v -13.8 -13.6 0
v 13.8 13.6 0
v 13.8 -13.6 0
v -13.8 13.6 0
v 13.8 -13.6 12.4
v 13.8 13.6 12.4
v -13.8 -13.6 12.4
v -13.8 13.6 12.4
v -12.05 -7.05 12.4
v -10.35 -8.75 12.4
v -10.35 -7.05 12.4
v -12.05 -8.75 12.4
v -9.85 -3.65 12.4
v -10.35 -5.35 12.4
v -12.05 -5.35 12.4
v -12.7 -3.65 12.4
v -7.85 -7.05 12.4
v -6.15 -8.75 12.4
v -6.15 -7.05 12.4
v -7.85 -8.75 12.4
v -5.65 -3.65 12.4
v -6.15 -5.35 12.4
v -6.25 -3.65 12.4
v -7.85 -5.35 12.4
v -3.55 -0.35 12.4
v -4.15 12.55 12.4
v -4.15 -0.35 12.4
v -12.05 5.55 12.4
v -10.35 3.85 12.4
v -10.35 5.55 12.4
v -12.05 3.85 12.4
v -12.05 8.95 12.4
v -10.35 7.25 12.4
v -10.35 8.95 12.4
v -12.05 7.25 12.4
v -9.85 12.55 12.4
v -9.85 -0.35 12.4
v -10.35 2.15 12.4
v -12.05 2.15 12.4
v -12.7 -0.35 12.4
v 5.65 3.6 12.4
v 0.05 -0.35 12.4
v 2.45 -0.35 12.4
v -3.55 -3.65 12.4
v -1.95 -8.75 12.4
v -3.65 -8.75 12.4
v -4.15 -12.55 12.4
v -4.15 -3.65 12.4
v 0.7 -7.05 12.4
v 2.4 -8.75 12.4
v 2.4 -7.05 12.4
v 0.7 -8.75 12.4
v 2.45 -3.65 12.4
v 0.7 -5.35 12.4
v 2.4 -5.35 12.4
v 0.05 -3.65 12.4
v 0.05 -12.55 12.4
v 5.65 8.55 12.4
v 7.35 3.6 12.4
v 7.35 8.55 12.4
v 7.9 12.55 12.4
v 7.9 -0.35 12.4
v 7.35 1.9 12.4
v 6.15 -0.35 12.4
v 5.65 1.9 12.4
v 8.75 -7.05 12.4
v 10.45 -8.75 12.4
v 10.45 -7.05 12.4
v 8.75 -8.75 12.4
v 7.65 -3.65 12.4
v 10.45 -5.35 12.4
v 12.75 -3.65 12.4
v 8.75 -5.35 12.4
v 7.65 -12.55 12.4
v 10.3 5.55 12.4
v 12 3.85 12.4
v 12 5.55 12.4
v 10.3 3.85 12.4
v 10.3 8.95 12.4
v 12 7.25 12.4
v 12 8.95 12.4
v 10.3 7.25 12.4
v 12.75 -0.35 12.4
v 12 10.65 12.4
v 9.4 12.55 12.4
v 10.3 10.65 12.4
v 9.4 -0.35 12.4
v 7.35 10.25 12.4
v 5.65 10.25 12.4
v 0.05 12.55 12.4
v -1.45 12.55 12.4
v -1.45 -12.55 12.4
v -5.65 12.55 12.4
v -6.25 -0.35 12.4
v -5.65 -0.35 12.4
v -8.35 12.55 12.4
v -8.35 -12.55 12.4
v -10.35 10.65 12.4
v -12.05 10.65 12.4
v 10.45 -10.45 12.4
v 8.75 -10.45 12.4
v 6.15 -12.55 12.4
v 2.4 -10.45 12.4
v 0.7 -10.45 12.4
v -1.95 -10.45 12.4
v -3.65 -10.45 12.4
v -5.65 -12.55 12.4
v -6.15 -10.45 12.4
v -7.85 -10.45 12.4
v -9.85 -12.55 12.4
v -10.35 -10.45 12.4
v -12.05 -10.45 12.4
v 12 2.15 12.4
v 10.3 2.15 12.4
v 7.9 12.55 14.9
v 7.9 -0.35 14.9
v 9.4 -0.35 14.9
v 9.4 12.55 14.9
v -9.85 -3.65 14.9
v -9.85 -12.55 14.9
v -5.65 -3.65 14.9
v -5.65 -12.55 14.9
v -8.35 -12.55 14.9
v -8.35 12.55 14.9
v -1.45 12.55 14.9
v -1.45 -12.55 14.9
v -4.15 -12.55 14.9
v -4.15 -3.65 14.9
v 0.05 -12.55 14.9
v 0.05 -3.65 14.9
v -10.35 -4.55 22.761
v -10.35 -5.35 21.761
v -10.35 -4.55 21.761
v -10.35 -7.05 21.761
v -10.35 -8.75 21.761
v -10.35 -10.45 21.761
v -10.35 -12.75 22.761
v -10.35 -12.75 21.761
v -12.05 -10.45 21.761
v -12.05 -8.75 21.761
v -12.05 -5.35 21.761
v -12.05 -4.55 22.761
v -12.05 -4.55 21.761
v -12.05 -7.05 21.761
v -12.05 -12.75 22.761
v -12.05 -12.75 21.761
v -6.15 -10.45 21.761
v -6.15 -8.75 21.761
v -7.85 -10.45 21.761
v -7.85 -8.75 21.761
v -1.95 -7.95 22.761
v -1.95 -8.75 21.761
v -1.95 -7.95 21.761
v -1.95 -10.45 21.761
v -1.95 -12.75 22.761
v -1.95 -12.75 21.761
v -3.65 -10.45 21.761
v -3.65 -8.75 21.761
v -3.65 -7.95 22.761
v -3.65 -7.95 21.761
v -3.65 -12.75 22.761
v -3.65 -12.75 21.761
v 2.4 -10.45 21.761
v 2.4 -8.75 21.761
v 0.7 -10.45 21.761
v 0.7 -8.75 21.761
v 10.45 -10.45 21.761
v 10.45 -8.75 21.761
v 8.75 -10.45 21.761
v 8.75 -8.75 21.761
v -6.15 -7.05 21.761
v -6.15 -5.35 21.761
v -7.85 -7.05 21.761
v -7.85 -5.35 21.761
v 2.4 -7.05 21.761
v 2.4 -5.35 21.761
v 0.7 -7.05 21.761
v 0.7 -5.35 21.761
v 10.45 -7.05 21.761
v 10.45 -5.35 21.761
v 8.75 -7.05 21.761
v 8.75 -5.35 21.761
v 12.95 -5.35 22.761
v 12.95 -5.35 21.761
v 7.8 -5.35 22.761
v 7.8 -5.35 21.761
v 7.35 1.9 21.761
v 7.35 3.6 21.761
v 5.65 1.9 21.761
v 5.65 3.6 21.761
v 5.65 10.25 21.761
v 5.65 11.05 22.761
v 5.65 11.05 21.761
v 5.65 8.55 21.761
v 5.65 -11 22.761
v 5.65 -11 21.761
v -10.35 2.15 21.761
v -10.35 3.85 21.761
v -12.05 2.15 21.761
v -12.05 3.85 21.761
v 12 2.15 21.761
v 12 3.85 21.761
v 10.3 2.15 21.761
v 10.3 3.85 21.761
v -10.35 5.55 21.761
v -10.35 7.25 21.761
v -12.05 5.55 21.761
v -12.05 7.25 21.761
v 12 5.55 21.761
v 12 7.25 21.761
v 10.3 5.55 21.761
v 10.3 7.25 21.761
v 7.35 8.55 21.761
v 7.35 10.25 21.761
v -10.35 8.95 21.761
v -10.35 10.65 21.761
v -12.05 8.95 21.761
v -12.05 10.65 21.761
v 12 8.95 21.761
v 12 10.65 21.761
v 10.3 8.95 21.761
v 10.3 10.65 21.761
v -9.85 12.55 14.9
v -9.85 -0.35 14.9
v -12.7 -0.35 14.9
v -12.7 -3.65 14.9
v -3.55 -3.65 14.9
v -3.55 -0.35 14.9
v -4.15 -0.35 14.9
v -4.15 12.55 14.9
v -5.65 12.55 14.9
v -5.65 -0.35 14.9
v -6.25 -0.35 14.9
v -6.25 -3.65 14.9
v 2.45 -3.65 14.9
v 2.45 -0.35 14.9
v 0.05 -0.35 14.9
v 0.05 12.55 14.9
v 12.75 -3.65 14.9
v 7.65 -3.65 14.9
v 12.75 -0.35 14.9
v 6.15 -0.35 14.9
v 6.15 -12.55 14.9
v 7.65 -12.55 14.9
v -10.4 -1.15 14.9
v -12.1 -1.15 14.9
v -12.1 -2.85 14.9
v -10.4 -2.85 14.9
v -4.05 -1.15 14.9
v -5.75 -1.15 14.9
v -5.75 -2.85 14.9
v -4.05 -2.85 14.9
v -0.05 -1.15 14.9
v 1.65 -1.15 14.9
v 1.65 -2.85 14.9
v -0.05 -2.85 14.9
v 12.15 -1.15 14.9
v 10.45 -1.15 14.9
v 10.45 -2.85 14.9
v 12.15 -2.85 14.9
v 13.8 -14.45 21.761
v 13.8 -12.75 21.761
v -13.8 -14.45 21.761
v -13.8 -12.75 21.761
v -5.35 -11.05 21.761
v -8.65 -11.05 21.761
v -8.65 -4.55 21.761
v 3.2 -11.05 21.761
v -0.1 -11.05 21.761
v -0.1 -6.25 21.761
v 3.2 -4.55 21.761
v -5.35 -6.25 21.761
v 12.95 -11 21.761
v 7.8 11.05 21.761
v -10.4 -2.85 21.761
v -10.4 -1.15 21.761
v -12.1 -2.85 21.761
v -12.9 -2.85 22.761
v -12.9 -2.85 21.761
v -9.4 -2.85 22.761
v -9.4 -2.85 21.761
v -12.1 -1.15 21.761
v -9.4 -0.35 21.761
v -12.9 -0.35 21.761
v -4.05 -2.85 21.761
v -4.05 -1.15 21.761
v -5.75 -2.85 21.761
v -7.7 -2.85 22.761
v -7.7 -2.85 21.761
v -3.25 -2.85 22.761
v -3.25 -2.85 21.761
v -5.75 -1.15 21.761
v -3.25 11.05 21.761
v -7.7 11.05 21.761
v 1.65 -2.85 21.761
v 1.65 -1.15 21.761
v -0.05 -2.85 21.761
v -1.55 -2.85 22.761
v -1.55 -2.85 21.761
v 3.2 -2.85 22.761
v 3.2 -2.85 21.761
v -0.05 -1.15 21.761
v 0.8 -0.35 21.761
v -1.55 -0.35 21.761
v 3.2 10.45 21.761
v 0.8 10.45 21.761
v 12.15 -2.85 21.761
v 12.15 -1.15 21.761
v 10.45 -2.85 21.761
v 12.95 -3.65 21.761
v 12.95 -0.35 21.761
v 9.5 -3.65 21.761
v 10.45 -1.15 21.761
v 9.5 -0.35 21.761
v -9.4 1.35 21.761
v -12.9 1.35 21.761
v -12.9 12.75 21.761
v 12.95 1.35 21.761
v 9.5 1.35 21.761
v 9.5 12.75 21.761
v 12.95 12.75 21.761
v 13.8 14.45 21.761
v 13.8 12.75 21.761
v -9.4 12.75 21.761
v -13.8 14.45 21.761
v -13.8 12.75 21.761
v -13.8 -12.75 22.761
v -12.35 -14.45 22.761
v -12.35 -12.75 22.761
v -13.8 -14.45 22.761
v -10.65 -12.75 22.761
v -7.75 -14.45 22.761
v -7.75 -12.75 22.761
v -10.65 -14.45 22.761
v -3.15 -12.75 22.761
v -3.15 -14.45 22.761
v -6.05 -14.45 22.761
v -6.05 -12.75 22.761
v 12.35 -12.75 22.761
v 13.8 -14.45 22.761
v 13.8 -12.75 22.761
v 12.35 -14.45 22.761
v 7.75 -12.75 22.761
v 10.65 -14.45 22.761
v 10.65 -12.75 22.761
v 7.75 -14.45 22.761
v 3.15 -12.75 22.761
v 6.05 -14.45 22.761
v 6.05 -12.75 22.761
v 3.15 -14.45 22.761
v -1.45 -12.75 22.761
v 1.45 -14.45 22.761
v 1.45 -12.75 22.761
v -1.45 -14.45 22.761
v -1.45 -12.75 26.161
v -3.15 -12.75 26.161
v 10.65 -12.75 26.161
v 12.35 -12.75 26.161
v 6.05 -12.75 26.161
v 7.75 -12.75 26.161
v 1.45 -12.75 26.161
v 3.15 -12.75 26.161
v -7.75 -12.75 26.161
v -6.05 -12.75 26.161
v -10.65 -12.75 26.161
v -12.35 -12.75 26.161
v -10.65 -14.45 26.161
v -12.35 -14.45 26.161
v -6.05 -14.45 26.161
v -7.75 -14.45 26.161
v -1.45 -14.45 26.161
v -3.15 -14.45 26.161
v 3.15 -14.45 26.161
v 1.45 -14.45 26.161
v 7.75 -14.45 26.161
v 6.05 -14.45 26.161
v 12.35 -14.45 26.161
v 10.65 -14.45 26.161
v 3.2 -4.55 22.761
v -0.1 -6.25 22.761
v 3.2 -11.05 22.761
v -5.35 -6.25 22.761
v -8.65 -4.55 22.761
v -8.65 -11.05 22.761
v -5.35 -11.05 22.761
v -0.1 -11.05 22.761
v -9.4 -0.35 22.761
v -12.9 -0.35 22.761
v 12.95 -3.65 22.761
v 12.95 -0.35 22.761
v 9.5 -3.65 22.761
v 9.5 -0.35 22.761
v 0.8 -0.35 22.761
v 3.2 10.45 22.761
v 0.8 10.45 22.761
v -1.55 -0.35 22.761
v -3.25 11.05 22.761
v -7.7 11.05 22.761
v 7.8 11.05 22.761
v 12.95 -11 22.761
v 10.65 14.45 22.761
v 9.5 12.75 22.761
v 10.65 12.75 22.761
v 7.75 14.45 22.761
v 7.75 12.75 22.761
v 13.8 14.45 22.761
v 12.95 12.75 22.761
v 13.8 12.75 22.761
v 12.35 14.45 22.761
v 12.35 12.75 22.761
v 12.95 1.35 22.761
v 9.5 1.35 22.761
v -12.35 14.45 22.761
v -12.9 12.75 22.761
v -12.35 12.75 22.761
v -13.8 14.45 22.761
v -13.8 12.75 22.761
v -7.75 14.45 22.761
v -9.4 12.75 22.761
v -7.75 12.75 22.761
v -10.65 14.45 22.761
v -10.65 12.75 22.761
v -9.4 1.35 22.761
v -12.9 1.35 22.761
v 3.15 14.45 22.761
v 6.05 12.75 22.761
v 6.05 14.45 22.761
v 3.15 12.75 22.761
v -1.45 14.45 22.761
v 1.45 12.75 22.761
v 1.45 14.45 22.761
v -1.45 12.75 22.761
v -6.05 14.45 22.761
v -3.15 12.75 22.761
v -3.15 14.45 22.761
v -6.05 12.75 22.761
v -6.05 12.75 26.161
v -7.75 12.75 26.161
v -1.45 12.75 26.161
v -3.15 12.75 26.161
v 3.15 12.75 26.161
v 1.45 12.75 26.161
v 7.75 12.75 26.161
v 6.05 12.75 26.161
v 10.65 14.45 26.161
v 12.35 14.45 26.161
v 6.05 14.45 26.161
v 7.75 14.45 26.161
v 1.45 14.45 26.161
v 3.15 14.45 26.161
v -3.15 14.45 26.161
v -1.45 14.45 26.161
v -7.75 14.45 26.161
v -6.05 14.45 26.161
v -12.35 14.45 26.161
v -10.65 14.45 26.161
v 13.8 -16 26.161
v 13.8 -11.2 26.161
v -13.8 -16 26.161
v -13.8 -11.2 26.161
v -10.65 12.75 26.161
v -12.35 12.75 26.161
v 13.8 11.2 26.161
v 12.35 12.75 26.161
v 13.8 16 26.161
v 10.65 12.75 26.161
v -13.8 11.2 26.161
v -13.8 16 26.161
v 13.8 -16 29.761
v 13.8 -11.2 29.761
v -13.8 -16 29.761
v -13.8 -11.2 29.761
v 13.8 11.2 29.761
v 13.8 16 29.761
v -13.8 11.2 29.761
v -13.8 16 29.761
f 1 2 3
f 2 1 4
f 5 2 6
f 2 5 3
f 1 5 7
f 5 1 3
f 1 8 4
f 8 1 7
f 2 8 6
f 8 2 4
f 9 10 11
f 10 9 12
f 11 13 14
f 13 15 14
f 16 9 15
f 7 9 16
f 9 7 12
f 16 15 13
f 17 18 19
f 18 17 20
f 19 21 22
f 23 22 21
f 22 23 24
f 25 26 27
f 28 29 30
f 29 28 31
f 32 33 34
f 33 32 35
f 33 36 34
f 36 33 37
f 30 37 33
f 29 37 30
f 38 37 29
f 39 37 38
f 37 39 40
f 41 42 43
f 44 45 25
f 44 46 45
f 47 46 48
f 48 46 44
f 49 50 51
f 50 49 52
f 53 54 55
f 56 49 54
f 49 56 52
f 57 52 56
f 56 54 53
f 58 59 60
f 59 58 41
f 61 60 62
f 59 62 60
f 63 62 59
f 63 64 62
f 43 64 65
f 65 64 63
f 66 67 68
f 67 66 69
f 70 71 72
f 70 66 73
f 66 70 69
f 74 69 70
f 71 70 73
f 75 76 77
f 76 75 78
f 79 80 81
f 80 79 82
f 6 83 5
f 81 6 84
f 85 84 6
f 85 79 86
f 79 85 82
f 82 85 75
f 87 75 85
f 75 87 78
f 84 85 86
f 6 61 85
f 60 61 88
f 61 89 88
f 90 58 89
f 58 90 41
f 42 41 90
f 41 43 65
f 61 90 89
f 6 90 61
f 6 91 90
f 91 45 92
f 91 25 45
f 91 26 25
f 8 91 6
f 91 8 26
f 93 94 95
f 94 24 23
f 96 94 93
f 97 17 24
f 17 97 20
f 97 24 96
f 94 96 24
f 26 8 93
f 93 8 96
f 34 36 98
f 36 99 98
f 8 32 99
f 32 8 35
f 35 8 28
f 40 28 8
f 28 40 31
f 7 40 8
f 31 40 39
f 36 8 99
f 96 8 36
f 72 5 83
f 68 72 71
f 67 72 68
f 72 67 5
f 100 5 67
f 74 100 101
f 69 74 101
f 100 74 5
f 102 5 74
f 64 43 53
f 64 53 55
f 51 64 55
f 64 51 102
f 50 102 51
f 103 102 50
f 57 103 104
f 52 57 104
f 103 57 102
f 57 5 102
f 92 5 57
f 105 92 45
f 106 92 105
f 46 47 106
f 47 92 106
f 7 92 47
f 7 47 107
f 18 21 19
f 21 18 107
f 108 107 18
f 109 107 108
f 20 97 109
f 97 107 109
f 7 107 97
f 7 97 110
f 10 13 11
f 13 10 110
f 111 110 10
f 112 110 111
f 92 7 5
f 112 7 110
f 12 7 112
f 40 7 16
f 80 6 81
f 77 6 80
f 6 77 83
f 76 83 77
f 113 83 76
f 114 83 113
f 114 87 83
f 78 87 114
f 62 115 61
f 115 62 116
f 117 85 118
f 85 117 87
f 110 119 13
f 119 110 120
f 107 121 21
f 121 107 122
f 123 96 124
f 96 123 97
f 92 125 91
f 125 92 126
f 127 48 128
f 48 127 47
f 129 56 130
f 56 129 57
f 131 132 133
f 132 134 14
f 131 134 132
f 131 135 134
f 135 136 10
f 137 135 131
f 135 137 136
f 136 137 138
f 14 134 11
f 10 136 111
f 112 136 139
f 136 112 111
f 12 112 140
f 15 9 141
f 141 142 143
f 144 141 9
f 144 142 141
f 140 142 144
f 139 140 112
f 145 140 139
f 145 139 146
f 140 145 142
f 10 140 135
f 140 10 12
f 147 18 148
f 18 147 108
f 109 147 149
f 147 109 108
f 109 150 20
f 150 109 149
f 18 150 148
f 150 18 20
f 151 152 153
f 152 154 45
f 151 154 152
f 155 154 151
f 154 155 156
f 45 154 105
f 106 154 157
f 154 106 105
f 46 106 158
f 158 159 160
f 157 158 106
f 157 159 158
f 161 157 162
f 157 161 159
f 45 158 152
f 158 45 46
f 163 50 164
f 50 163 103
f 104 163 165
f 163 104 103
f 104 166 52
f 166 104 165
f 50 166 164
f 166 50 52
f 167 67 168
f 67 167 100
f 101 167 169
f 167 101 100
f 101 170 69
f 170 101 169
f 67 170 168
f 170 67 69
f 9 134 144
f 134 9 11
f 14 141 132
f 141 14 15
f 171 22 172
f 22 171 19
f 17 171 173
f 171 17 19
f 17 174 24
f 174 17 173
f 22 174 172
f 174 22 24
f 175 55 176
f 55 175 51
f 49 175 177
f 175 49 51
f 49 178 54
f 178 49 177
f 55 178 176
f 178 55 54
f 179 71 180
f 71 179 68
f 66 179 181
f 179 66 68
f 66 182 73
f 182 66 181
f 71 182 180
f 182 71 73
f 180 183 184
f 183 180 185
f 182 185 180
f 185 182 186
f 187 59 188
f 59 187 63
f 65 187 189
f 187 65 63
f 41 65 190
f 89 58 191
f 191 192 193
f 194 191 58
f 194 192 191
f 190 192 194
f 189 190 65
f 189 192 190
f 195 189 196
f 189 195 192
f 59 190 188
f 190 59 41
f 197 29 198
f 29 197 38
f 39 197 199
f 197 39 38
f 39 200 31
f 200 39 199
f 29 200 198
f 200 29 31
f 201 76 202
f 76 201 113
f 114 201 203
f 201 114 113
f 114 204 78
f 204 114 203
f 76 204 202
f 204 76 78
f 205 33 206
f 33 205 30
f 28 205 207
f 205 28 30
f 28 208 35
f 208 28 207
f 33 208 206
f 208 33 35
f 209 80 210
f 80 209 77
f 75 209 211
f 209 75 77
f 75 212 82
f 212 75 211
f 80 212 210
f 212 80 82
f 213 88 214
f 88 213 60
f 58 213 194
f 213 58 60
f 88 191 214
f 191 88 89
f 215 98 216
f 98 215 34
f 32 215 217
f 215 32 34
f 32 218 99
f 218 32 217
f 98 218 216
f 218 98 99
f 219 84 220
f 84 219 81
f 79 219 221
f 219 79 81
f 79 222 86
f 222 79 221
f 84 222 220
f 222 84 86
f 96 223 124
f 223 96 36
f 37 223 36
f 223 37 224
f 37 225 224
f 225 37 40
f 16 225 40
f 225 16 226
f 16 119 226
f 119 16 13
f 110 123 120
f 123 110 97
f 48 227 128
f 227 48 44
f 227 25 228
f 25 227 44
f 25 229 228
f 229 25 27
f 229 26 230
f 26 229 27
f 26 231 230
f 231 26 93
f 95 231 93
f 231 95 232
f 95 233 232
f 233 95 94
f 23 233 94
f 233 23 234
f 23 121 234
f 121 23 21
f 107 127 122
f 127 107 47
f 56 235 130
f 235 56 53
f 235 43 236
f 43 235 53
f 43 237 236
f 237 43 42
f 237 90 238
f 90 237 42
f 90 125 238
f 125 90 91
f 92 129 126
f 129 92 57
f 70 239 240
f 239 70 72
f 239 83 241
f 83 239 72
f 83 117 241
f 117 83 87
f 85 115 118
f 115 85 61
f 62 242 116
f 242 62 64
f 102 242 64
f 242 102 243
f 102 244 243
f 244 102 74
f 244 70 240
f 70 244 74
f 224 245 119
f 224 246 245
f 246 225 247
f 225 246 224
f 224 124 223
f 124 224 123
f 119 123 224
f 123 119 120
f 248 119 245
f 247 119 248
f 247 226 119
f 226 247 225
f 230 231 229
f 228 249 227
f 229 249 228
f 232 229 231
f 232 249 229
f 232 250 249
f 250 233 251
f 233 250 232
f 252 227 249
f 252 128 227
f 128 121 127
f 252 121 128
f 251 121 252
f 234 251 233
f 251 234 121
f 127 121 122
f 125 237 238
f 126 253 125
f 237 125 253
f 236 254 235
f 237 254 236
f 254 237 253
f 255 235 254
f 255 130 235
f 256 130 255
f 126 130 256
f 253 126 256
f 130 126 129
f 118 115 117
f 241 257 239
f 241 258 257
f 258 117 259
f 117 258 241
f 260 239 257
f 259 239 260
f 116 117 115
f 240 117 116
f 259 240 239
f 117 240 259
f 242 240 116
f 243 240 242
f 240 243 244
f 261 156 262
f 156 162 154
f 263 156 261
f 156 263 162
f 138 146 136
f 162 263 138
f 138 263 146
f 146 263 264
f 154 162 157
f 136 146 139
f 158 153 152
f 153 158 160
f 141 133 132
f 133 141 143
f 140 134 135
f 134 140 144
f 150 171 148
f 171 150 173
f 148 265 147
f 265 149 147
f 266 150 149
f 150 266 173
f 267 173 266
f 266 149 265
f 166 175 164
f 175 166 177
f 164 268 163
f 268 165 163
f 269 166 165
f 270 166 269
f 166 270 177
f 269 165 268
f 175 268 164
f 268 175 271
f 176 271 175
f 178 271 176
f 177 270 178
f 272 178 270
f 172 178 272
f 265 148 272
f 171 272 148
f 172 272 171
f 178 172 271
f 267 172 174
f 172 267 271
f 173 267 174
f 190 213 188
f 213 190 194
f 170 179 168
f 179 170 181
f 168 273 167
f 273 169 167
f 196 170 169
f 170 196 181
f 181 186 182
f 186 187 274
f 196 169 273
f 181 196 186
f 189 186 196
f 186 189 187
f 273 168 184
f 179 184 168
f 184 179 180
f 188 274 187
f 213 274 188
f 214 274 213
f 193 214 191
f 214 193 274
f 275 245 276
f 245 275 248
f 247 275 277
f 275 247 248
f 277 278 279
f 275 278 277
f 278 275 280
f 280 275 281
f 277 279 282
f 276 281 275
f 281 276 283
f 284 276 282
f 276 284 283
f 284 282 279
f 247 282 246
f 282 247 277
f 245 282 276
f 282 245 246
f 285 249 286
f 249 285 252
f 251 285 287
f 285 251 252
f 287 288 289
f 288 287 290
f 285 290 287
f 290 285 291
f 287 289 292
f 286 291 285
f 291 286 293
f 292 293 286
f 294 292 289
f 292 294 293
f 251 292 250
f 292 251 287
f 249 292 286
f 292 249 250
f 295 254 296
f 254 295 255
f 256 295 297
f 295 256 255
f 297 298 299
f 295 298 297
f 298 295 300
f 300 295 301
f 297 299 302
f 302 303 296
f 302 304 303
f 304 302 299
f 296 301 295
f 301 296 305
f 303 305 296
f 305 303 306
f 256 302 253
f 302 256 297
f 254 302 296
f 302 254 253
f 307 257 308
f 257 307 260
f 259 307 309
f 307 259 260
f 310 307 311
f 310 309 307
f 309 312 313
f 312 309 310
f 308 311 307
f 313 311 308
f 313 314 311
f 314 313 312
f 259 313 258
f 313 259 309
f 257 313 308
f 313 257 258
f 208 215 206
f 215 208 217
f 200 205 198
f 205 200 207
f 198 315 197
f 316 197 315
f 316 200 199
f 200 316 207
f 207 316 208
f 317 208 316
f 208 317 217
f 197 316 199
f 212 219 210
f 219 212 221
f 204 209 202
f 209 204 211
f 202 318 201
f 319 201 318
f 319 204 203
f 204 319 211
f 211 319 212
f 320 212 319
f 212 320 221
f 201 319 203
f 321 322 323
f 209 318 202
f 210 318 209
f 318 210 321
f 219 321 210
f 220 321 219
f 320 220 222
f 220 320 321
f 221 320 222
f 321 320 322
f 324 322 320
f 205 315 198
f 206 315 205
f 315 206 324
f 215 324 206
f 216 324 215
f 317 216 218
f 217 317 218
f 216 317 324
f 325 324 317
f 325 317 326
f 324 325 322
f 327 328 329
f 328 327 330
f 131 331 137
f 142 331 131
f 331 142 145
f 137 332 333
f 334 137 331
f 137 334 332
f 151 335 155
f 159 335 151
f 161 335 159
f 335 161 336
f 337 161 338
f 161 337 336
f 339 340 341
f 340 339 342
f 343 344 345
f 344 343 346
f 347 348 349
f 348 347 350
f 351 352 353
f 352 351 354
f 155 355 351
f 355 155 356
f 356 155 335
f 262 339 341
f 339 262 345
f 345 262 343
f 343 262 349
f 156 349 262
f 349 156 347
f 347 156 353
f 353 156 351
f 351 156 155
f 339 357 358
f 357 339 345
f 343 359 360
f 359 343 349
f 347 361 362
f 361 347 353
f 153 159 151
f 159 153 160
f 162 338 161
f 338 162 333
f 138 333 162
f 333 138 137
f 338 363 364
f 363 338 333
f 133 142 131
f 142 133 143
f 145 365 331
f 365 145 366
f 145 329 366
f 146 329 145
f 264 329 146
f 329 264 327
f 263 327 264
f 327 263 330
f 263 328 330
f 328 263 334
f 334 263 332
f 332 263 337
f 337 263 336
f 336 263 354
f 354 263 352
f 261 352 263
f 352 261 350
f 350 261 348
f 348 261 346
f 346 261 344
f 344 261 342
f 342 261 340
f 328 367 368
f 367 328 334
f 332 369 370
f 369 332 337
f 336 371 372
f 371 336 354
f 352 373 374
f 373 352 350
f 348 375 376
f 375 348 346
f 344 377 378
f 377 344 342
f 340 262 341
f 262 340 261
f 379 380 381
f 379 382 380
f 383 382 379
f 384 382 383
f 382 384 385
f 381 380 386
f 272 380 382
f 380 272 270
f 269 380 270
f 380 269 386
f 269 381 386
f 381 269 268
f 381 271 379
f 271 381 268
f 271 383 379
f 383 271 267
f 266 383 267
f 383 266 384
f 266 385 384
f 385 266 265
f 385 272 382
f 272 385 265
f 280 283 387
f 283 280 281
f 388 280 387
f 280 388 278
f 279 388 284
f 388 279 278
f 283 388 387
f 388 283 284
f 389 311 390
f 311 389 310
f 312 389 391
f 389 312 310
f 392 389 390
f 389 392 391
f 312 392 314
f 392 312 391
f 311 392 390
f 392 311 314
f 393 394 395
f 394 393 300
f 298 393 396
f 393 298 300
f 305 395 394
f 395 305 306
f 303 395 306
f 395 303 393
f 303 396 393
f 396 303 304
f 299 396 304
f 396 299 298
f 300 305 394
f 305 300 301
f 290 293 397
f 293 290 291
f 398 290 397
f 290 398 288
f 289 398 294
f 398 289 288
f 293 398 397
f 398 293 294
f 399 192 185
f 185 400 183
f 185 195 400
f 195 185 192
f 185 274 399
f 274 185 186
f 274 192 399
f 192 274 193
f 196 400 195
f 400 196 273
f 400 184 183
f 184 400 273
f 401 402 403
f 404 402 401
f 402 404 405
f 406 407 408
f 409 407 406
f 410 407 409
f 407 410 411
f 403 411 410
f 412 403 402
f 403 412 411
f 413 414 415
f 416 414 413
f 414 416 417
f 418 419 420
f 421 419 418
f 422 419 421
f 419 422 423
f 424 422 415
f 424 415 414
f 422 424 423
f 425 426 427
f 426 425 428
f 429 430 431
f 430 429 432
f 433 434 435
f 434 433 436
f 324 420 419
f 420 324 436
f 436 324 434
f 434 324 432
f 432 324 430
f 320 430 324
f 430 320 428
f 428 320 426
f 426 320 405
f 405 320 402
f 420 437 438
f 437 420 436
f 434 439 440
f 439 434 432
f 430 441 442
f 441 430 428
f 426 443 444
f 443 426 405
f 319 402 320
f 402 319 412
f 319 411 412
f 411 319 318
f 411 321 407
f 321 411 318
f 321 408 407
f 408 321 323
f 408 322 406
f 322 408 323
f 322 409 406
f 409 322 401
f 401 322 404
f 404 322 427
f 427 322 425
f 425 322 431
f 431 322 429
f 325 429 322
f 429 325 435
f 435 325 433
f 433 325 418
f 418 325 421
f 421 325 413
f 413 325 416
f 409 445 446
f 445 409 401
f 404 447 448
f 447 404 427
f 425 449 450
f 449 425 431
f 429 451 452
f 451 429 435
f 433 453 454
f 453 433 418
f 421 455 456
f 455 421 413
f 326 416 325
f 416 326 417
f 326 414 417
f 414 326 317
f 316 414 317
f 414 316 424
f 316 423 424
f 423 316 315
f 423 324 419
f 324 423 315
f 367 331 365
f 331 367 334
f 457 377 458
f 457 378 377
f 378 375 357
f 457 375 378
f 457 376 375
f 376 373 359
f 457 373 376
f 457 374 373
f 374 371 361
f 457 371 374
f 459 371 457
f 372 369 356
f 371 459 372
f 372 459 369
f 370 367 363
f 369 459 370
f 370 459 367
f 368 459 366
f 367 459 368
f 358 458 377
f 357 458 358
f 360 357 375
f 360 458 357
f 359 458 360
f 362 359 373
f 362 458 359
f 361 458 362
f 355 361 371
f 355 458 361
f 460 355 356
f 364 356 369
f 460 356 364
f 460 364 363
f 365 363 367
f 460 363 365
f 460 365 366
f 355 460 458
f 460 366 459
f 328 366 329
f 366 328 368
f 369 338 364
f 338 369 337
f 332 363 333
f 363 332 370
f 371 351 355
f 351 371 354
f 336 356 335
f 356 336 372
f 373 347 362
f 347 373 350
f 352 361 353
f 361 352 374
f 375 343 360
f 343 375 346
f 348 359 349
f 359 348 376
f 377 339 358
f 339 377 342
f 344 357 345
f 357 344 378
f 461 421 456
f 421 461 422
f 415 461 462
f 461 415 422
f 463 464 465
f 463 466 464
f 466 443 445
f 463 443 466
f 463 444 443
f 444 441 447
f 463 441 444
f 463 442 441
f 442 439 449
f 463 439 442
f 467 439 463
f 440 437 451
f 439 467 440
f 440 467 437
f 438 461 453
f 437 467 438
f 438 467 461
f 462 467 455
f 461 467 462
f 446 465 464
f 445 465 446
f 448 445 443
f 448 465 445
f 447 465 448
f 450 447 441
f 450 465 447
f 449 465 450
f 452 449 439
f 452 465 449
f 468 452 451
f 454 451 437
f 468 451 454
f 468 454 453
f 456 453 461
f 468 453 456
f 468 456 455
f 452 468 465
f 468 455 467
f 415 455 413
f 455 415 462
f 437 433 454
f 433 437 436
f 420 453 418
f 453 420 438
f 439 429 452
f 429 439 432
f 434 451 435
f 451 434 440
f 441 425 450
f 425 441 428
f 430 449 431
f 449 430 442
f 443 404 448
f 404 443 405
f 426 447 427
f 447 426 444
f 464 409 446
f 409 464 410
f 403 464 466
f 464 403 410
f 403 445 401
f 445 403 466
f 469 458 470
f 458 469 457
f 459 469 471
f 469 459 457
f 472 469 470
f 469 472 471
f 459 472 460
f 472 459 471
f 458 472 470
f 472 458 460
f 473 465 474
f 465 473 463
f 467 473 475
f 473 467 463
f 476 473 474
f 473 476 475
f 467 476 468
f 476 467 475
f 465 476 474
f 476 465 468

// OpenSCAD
// Generated by SolidPython 0.4.2 on 2020-09-29 23:22:00
//!OpenSCAD

scale(v = 0.0100000000) {
	translate(v = [-1380, -1360, 0]) {
		union() {
			color(c = [0.4000000000, 0.4000000000, 0.4000000000]) {
				translate(v = [0, 0, 0]) {
					linear_extrude(height = 1000.0000000000) {
						polygon(paths = [[0, 1, 2, 3]], points = [[0, 0], [0, 2720], [2760, 2720], [2760, 0]]);
					}
				}
			}
			color(c = [0.2000000000, 0.6000000000, 0.2000000000]) {
				translate(v = [0, 0, 1000.0000000000]) {
					linear_extrude(height = 120.0000000000) {
						polygon(paths = [[0, 1, 2, 3]], points = [[0, 1305], [0, 2720], [2760, 2720], [2760, 1305]]);
					}
				}
			}
			color(c = [0.4000000000, 0.4000000000, 0.4000000000]) {
				translate(v = [0, 0, 1000.0000000000]) {
					linear_extrude(height = 120.0000000000) {
						polygon(paths = [[0, 1, 2, 3]], points = [[0, 0], [0, 1305], [2760, 1305], [2760, 0]]);
					}
				}
			}
			color(c = [0.9000000000, 0.6000000000, 0.6000000000]) {
				translate(v = [0, 0, 1120.0000000000]) {
					linear_extrude(height = 120.0000000000) {
						polygon(paths = [[0, 1, 2, 3]], points = [[135, 1485], [135, 2485], [395, 2485], [395, 1485]]);
					}
				}
			}
			color(c = [0.9000000000, 0.6000000000, 0.6000000000]) {
				translate(v = [0, 0, 1120.0000000000]) {
					linear_extrude(height = 120.0000000000) {
						polygon(paths = [[0, 1, 2, 3]], points = [[545, 1485], [545, 2485], [815, 2485], [815, 1485]]);
					}
				}
			}
			color(c = [0.9000000000, 0.6000000000, 0.6000000000]) {
				translate(v = [0, 0, 1120.0000000000]) {
					linear_extrude(height = 120.0000000000) {
						polygon(paths = [[0, 1, 2, 3]], points = [[965, 1485], [965, 2485], [1235, 2485], [1235, 1485]]);
					}
				}
			}
			color(c = [0.9000000000, 0.6000000000, 0.6000000000]) {
				translate(v = [0, 0, 1120.0000000000]) {
					linear_extrude(height = 120.0000000000) {
						polygon(paths = [[0, 1, 2, 3]], points = [[1385, 1485], [1385, 2485], [2170, 2485], [2170, 1485]]);
					}
				}
			}
			color(c = [0.9000000000, 0.6000000000, 0.6000000000]) {
				translate(v = [0, 0, 1120.0000000000]) {
					linear_extrude(height = 120.0000000000) {
						polygon(paths = [[0, 1, 2, 3]], points = [[2320, 1485], [2320, 2485], [2620, 2485], [2620, 1485]]);
					}
				}
			}
			color(c = [0.9000000000, 0.6000000000, 0.9000000000]) {
				translate(v = [0, 0, 1120.0000000000]) {
					linear_extrude(height = 120.0000000000) {
						polygon(paths = [[0, 1, 2, 3]], points = [[135, 235], [135, 885], [395, 885], [395, 235]]);
					}
				}
			}
			color(c = [0.9000000000, 0.6000000000, 0.9000000000]) {
				translate(v = [0, 0, 1120.0000000000]) {
					linear_extrude(height = 120.0000000000) {
						polygon(paths = [[0, 1, 2, 3]], points = [[545, 235], [545, 885], [815, 885], [815, 235]]);
					}
				}
			}
			color(c = [0.9000000000, 0.6000000000, 0.9000000000]) {
				translate(v = [0, 0, 1120.0000000000]) {
					linear_extrude(height = 120.0000000000) {
						polygon(paths = [[0, 1, 2, 3]], points = [[965, 235], [965, 885], [1235, 885], [1235, 235]]);
					}
				}
			}
			color(c = [0.9000000000, 0.6000000000, 0.9000000000]) {
				translate(v = [0, 0, 1120.0000000000]) {
					linear_extrude(height = 120.0000000000) {
						polygon(paths = [[0, 1, 2, 3]], points = [[1385, 235], [1385, 885], [1995, 885], [1995, 235]]);
					}
				}
			}
			color(c = [0.9000000000, 0.6000000000, 0.9000000000]) {
				translate(v = [0, 0, 1120.0000000000]) {
					linear_extrude(height = 120.0000000000) {
						polygon(paths = [[0, 1, 2, 3]], points = [[2145, 235], [2145, 885], [2485, 885], [2485, 235]]);
					}
				}
			}
			color(c = [0.2000000000, 0.6000000000, 0.2000000000]) {
				translate(v = [0, 0, 1120.0000000000]) {
					linear_extrude(height = 120.0000000000) {
						difference() {
							polygon(paths = [[0, 1, 2, 3]], points = [[0, 1305], [0, 2720], [2760, 2720], [2760, 1305]]);
							polygon(paths = [[0, 1, 2, 3]], points = [[135, 1485], [395, 1485], [395, 2485], [135, 2485]]);
							polygon(paths = [[0, 1, 2, 3]], points = [[545, 1485], [815, 1485], [815, 2485], [545, 2485]]);
							polygon(paths = [[0, 1, 2, 3]], points = [[965, 1485], [1235, 1485], [1235, 2485], [965, 2485]]);
							polygon(paths = [[0, 1, 2, 3]], points = [[1385, 1485], [2170, 1485], [2170, 2485], [1385, 2485]]);
							polygon(paths = [[0, 1, 2, 3]], points = [[2320, 1485], [2620, 1485], [2620, 2485], [2320, 2485]]);
						}
					}
				}
			}
			color(c = [0.4000000000, 0.4000000000, 0.4000000000]) {
				translate(v = [0, 0, 1120.0000000000]) {
					linear_extrude(height = 120.0000000000) {
						difference() {
							polygon(paths = [[0, 1, 2, 3]], points = [[0, 0], [0, 1305], [2760, 1305], [2760, 0]]);
							polygon(paths = [[0, 1, 2, 3]], points = [[135, 235], [395, 235], [395, 885], [135, 885]]);
							polygon(paths = [[0, 1, 2, 3]], points = [[545, 235], [815, 235], [815, 885], [545, 885]]);
							polygon(paths = [[0, 1, 2, 3]], points = [[965, 235], [1235, 235], [1235, 885], [965, 885]]);
							polygon(paths = [[0, 1, 2, 3]], points = [[1385, 235], [1995, 235], [1995, 885], [1385, 885]]);
							polygon(paths = [[0, 1, 2, 3]], points = [[2145, 235], [2485, 235], [2485, 885], [2145, 885]]);
						}
					}
				}
			}
			color(c = [0.1000000000, 0.1000000000, 0.1000000000]) {
				translate(v = [0, 0, 1240.0000000000]) {
					linear_extrude(height = 70.0000000000) {
						polygon(paths = [[0, 1, 2, 3]], points = [[175, 315], [175, 485], [345, 485], [345, 315]]);
					}
				}
			}
			color(c = [0.1000000000, 0.1000000000, 0.1000000000]) {
				translate(v = [0, 0, 1240.0000000000]) {
					linear_extrude(height = 70.0000000000) {
						polygon(paths = [[0, 1, 2, 3]], points = [[595, 315], [595, 485], [765, 485], [765, 315]]);
					}
				}
			}
			color(c = [0.1000000000, 0.1000000000, 0.1000000000]) {
				translate(v = [0, 0, 1240.0000000000]) {
					linear_extrude(height = 70.0000000000) {
						polygon(paths = [[0, 1, 2, 3]], points = [[1015, 315], [1015, 485], [1185, 485], [1185, 315]]);
					}
				}
			}
			color(c = [0.1000000000, 0.1000000000, 0.1000000000]) {
				translate(v = [0, 0, 1240.0000000000]) {
					linear_extrude(height = 70.0000000000) {
						polygon(paths = [[0, 1, 2, 3]], points = [[1450, 315], [1450, 485], [1620, 485], [1620, 315]]);
					}
				}
			}
			color(c = [0.1000000000, 0.1000000000, 0.1000000000]) {
				translate(v = [0, 0, 1240.0000000000]) {
					linear_extrude(height = 70.0000000000) {
						polygon(paths = [[0, 1, 2, 3]], points = [[2255, 315], [2255, 485], [2425, 485], [2425, 315]]);
					}
				}
			}
			color(c = [0.1000000000, 0.1000000000, 0.1000000000]) {
				translate(v = [0, 0, 1240.0000000000]) {
					linear_extrude(height = 70.0000000000) {
						polygon(paths = [[0, 1, 2, 3]], points = [[175, 655], [175, 825], [345, 825], [345, 655]]);
					}
				}
			}
			color(c = [0.1000000000, 0.1000000000, 0.1000000000]) {
				translate(v = [0, 0, 1240.0000000000]) {
					linear_extrude(height = 70.0000000000) {
						polygon(paths = [[0, 1, 2, 3]], points = [[595, 655], [595, 825], [765, 825], [765, 655]]);
					}
				}
			}
			color(c = [0.1000000000, 0.1000000000, 0.1000000000]) {
				translate(v = [0, 0, 1240.0000000000]) {
					linear_extrude(height = 70.0000000000) {
						polygon(paths = [[0, 1, 2, 3]], points = [[1450, 655], [1450, 825], [1620, 825], [1620, 655]]);
					}
				}
			}
			color(c = [0.1000000000, 0.1000000000, 0.1000000000]) {
				translate(v = [0, 0, 1240.0000000000]) {
					linear_extrude(height = 70.0000000000) {
						polygon(paths = [[0, 1, 2, 3]], points = [[2255, 655], [2255, 825], [2425, 825], [2425, 655]]);
					}
				}
			}
			color(c = [0.1000000000, 0.1000000000, 0.1000000000]) {
				translate(v = [0, 0, 1240.0000000000]) {
					linear_extrude(height = 70.0000000000) {
						polygon(paths = [[0, 1, 2, 3]], points = [[1945, 1550], [1945, 1720], [2115, 1720], [2115, 1550]]);
					}
				}
			}
			color(c = [0.1000000000, 0.1000000000, 0.1000000000]) {
				translate(v = [0, 0, 1240.0000000000]) {
					linear_extrude(height = 70.0000000000) {
						polygon(paths = [[0, 1, 2, 3]], points = [[175, 1575], [175, 1745], [345, 1745], [345, 1575]]);
					}
				}
			}
			color(c = [0.1000000000, 0.1000000000, 0.1000000000]) {
				translate(v = [0, 0, 1240.0000000000]) {
					linear_extrude(height = 70.0000000000) {
						polygon(paths = [[0, 1, 2, 3]], points = [[2410, 1575], [2410, 1745], [2580, 1745], [2580, 1575]]);
					}
				}
			}
			color(c = [0.1000000000, 0.1000000000, 0.1000000000]) {
				translate(v = [0, 0, 1240.0000000000]) {
					linear_extrude(height = 70.0000000000) {
						polygon(paths = [[0, 1, 2, 3]], points = [[175, 1915], [175, 2085], [345, 2085], [345, 1915]]);
					}
				}
			}
			color(c = [0.1000000000, 0.1000000000, 0.1000000000]) {
				translate(v = [0, 0, 1240.0000000000]) {
					linear_extrude(height = 70.0000000000) {
						polygon(paths = [[0, 1, 2, 3]], points = [[2410, 1915], [2410, 2085], [2580, 2085], [2580, 1915]]);
					}
				}
			}
			color(c = [0.1000000000, 0.1000000000, 0.1000000000]) {
				translate(v = [0, 0, 1240.0000000000]) {
					linear_extrude(height = 70.0000000000) {
						polygon(paths = [[0, 1, 2, 3]], points = [[1945, 2215], [1945, 2385], [2115, 2385], [2115, 2215]]);
					}
				}
			}
			color(c = [0.1000000000, 0.1000000000, 0.1000000000]) {
				translate(v = [0, 0, 1240.0000000000]) {
					linear_extrude(height = 70.0000000000) {
						polygon(paths = [[0, 1, 2, 3]], points = [[175, 2255], [175, 2425], [345, 2425], [345, 2255]]);
					}
				}
			}
			color(c = [0.1000000000, 0.1000000000, 0.1000000000]) {
				translate(v = [0, 0, 1240.0000000000]) {
					linear_extrude(height = 70.0000000000) {
						polygon(paths = [[0, 1, 2, 3]], points = [[2410, 2255], [2410, 2425], [2580, 2425], [2580, 2255]]);
					}
				}
			}
			color(c = [1.0000000000, 1.0000000000, 1.0000000000]) {
				translate(v = [0, 0, 1240.0000000000]) {
					linear_extrude(height = 70.0000000000) {
						polygon(paths = [[0, 1, 2, 3, 4, 5, 6, 7]], points = [[395, 105], [395, 995], [110, 995], [110, 1325], [395, 1325], [395, 2615], [545, 2615], [545, 105]]);
					}
				}
			}
			color(c = [1.0000000000, 1.0000000000, 1.0000000000]) {
				translate(v = [0, 0, 1240.0000000000]) {
					linear_extrude(height = 70.0000000000) {
						polygon(paths = [[0, 1, 2, 3, 4, 5, 6, 7, 8, 9, 10, 11]], points = [[815, 105], [815, 995], [755, 995], [755, 1325], [815, 1325], [815, 2615], [965, 2615], [965, 1325], [1025, 1325], [1025, 995], [965, 995], [965, 105]]);
					}
				}
			}
			color(c = [1.0000000000, 1.0000000000, 1.0000000000]) {
				translate(v = [0, 0, 1240.0000000000]) {
					linear_extrude(height = 70.0000000000) {
						polygon(paths = [[0, 1, 2, 3, 4, 5, 6, 7]], points = [[1235, 105], [1235, 2615], [1385, 2615], [1385, 1325], [1625, 1325], [1625, 995], [1385, 995], [1385, 105]]);
					}
				}
			}
			color(c = [1.0000000000, 1.0000000000, 1.0000000000]) {
				translate(v = [0, 0, 1240.0000000000]) {
					linear_extrude(height = 70.0000000000) {
						polygon(paths = [[0, 1, 2, 3, 4, 5, 6, 7, 8, 9]], points = [[1995, 105], [1995, 1325], [2170, 1325], [2170, 2615], [2320, 2615], [2320, 1325], [2655, 1325], [2655, 995], [2145, 995], [2145, 105]]);
					}
				}
			}
			color(c = [0.1000000000, 0.1000000000, 0.1000000000]) {
				translate(v = [0, 0, 1310.0000000000]) {
					linear_extrude(height = 180.0000000000) {
						polygon(paths = [[0, 1, 2, 3]], points = [[175, 315], [175, 485], [345, 485], [345, 315]]);
					}
				}
			}
			color(c = [0.1000000000, 0.1000000000, 0.1000000000]) {
				translate(v = [0, 0, 1310.0000000000]) {
					linear_extrude(height = 180.0000000000) {
						polygon(paths = [[0, 1, 2, 3]], points = [[595, 315], [595, 485], [765, 485], [765, 315]]);
					}
				}
			}
			color(c = [0.1000000000, 0.1000000000, 0.1000000000]) {
				translate(v = [0, 0, 1310.0000000000]) {
					linear_extrude(height = 180.0000000000) {
						polygon(paths = [[0, 1, 2, 3]], points = [[1015, 315], [1015, 485], [1185, 485], [1185, 315]]);
					}
				}
			}
			color(c = [0.1000000000, 0.1000000000, 0.1000000000]) {
				translate(v = [0, 0, 1310.0000000000]) {
					linear_extrude(height = 180.0000000000) {
						polygon(paths = [[0, 1, 2, 3]], points = [[1450, 315], [1450, 485], [1620, 485], [1620, 315]]);
					}
				}
			}
			color(c = [0.1000000000, 0.1000000000, 0.1000000000]) {
				translate(v = [0, 0, 1310.0000000000]) {
					linear_extrude(height = 180.0000000000) {
						polygon(paths = [[0, 1, 2, 3]], points = [[2255, 315], [2255, 485], [2425, 485], [2425, 315]]);
					}
				}
			}
			color(c = [0.1000000000, 0.1000000000, 0.1000000000]) {
				translate(v = [0, 0, 1310.0000000000]) {
					linear_extrude(height = 180.0000000000) {
						polygon(paths = [[0, 1, 2, 3]], points = [[175, 655], [175, 825], [345, 825], [345, 655]]);
					}
				}
			}
			color(c = [0.1000000000, 0.1000000000, 0.1000000000]) {
				translate(v = [0, 0, 1310.0000000000]) {
					linear_extrude(height = 180.0000000000) {
						polygon(paths = [[0, 1, 2, 3]], points = [[595, 655], [595, 825], [765, 825], [765, 655]]);
					}
				}
			}
			color(c = [0.1000000000, 0.1000000000, 0.1000000000]) {
				translate(v = [0, 0, 1310.0000000000]) {
					linear_extrude(height = 180.0000000000) {
						polygon(paths = [[0, 1, 2, 3]], points = [[1450, 655], [1450, 825], [1620, 825], [1620, 655]]);
					}
				}
			}
			color(c = [0.1000000000, 0.1000000000, 0.1000000000]) {
				translate(v = [0, 0, 1310.0000000000]) {
					linear_extrude(height = 180.0000000000) {
						polygon(paths = [[0, 1, 2, 3]], points = [[2255, 655], [2255, 825], [2425, 825], [2425, 655]]);
					}
				}
			}
			color(c = [0.1000000000, 0.1000000000, 0.1000000000]) {
				translate(v = [0, 0, 1310.0000000000]) {
					linear_extrude(height = 180.0000000000) {
						polygon(paths = [[0, 1, 2, 3]], points = [[1945, 1550], [1945, 1720], [2115, 1720], [2115, 1550]]);
					}
				}
			}
			color(c = [0.1000000000, 0.1000000000, 0.1000000000]) {
				translate(v = [0, 0, 1310.0000000000]) {
					linear_extrude(height = 180.0000000000) {
						polygon(paths = [[0, 1, 2, 3]], points = [[175, 1575], [175, 1745], [345, 1745], [345, 1575]]);
					}
				}
			}
			color(c = [0.1000000000, 0.1000000000, 0.1000000000]) {
				translate(v = [0, 0, 1310.0000000000]) {
					linear_extrude(height = 180.0000000000) {
						polygon(paths = [[0, 1, 2, 3]], points = [[2410, 1575], [2410, 1745], [2580, 1745], [2580, 1575]]);
					}
				}
			}
			color(c = [0.1000000000, 0.1000000000, 0.1000000000]) {
				translate(v = [0, 0, 1310.0000000000]) {
					linear_extrude(height = 180.0000000000) {
						polygon(paths = [[0, 1, 2, 3]], points = [[175, 1915], [175, 2085], [345, 2085], [345, 1915]]);
					}
				}
			}
			color(c = [0.1000000000, 0.1000000000, 0.1000000000]) {
				translate(v = [0, 0, 1310.0000000000]) {
					linear_extrude(height = 180.0000000000) {
						polygon(paths = [[0, 1, 2, 3]], points = [[2410, 1915], [2410, 2085], [2580, 2085], [2580, 1915]]);
					}
				}
			}
			color(c = [0.1000000000, 0.1000000000, 0.1000000000]) {
				translate(v = [0, 0, 1310.0000000000]) {
					linear_extrude(height = 180.0000000000) {
						polygon(paths = [[0, 1, 2, 3]], points = [[1945, 2215], [1945, 2385], [2115, 2385], [2115, 2215]]);
					}
				}
			}
			color(c = [0.1000000000, 0.1000000000, 0.1000000000]) {
				translate(v = [0, 0, 1310.0000000000]) {
					linear_extrude(height = 180.0000000000) {
						polygon(paths = [[0, 1, 2, 3]], points = [[175, 2255], [175, 2425], [345, 2425], [345, 2255]]);
					}
				}
			}
			color(c = [0.1000000000, 0.1000000000, 0.1000000000]) {
				translate(v = [0, 0, 1310.0000000000]) {
					linear_extrude(height = 180.0000000000) {
						polygon(paths = [[0, 1, 2, 3]], points = [[2410, 2255], [2410, 2425], [2580, 2425], [2580, 2255]]);
					}
				}
			}
			color(c = [0.7000000000, 0, 0]) {
				translate(v = [0, 0, 1310.0000000000]) {
					linear_extrude(height = 180.0000000000) {
						polygon(paths = [[0, 1, 2, 3, 4, 5, 6, 7]], points = [[395, 105], [395, 995], [110, 995], [110, 1325], [395, 1325], [395, 2615], [545, 2615], [545, 105]]);
					}
				}
			}
			color(c = [0.7000000000, 0, 0]) {
				translate(v = [0, 0, 1310.0000000000]) {
					linear_extrude(height = 180.0000000000) {
						polygon(paths = [[0, 1, 2, 3, 4, 5, 6, 7, 8, 9, 10, 11]], points = [[815, 105], [815, 995], [755, 995], [755, 1325], [815, 1325], [815, 2615], [965, 2615], [965, 1325], [1025, 1325], [1025, 995], [965, 995], [965, 105]]);
					}
				}
			}
			color(c = [0.7000000000, 0, 0]) {
				translate(v = [0, 0, 1310.0000000000]) {
					linear_extrude(height = 180.0000000000) {
						polygon(paths = [[0, 1, 2, 3, 4, 5, 6, 7]], points = [[1235, 105], [1235, 2615], [1385, 2615], [1385, 1325], [1625, 1325], [1625, 995], [1385, 995], [1385, 105]]);
					}
				}
			}
			color(c = [0.7000000000, 0, 0]) {
				translate(v = [0, 0, 1310.0000000000]) {
					linear_extrude(height = 180.0000000000) {
						polygon(paths = [[0, 1, 2, 3, 4, 5, 6, 7, 8, 9]], points = [[1995, 105], [1995, 1325], [2170, 1325], [2170, 2615], [2320, 2615], [2320, 1325], [2655, 1325], [2655, 995], [2145, 995], [2145, 105]]);
					}
				}
			}
			color(c = [0.1000000000, 0.1000000000, 0.1000000000]) {
				translate(v = [0, 0, 1490.0000000000]) {
					linear_extrude(height = 686.1000000000) {
						polygon(paths = [[0, 1, 2, 3]], points = [[175, 315], [175, 485], [345, 485], [345, 315]]);
					}
				}
			}
			color(c = [0.1000000000, 0.1000000000, 0.1000000000]) {
				translate(v = [0, 0, 1490.0000000000]) {
					linear_extrude(height = 686.1000000000) {
						polygon(paths = [[0, 1, 2, 3]], points = [[595, 315], [595, 485], [765, 485], [765, 315]]);
					}
				}
			}
			color(c = [0.1000000000, 0.1000000000, 0.1000000000]) {
				translate(v = [0, 0, 1490.0000000000]) {
					linear_extrude(height = 686.1000000000) {
						polygon(paths = [[0, 1, 2, 3]], points = [[1015, 315], [1015, 485], [1185, 485], [1185, 315]]);
					}
				}
			}
			color(c = [0.1000000000, 0.1000000000, 0.1000000000]) {
				translate(v = [0, 0, 1490.0000000000]) {
					linear_extrude(height = 686.1000000000) {
						polygon(paths = [[0, 1, 2, 3]], points = [[1450, 315], [1450, 485], [1620, 485], [1620, 315]]);
					}
				}
			}
			color(c = [0.1000000000, 0.1000000000, 0.1000000000]) {
				translate(v = [0, 0, 1490.0000000000]) {
					linear_extrude(height = 686.1000000000) {
						polygon(paths = [[0, 1, 2, 3]], points = [[2255, 315], [2255, 485], [2425, 485], [2425, 315]]);
					}
				}
			}
			color(c = [0.1000000000, 0.1000000000, 0.1000000000]) {
				translate(v = [0, 0, 1490.0000000000]) {
					linear_extrude(height = 686.1000000000) {
						polygon(paths = [[0, 1, 2, 3]], points = [[175, 655], [175, 825], [345, 825], [345, 655]]);
					}
				}
			}
			color(c = [0.1000000000, 0.1000000000, 0.1000000000]) {
				translate(v = [0, 0, 1490.0000000000]) {
					linear_extrude(height = 686.1000000000) {
						polygon(paths = [[0, 1, 2, 3]], points = [[595, 655], [595, 825], [765, 825], [765, 655]]);
					}
				}
			}
			color(c = [0.1000000000, 0.1000000000, 0.1000000000]) {
				translate(v = [0, 0, 1490.0000000000]) {
					linear_extrude(height = 686.1000000000) {
						polygon(paths = [[0, 1, 2, 3]], points = [[1450, 655], [1450, 825], [1620, 825], [1620, 655]]);
					}
				}
			}
			color(c = [0.1000000000, 0.1000000000, 0.1000000000]) {
				translate(v = [0, 0, 1490.0000000000]) {
					linear_extrude(height = 686.1000000000) {
						polygon(paths = [[0, 1, 2, 3]], points = [[2255, 655], [2255, 825], [2425, 825], [2425, 655]]);
					}
				}
			}
			color(c = [0.1000000000, 0.1000000000, 0.1000000000]) {
				translate(v = [0, 0, 1490.0000000000]) {
					linear_extrude(height = 686.1000000000) {
						polygon(paths = [[0, 1, 2, 3]], points = [[170, 1075], [170, 1245], [340, 1245], [340, 1075]]);
					}
				}
			}
			color(c = [0.1000000000, 0.1000000000, 0.1000000000]) {
				translate(v = [0, 0, 1490.0000000000]) {
					linear_extrude(height = 686.1000000000) {
						polygon(paths = [[0, 1, 2, 3]], points = [[805, 1075], [805, 1245], [975, 1245], [975, 1075]]);
					}
				}
			}
			color(c = [0.1000000000, 0.1000000000, 0.1000000000]) {
				translate(v = [0, 0, 1490.0000000000]) {
					linear_extrude(height = 686.1000000000) {
						polygon(paths = [[0, 1, 2, 3]], points = [[1375, 1075], [1375, 1245], [1545, 1245], [1545, 1075]]);
					}
				}
			}
			color(c = [0.1000000000, 0.1000000000, 0.1000000000]) {
				translate(v = [0, 0, 1490.0000000000]) {
					linear_extrude(height = 686.1000000000) {
						polygon(paths = [[0, 1, 2, 3]], points = [[2425, 1075], [2425, 1245], [2595, 1245], [2595, 1075]]);
					}
				}
			}
			color(c = [0.1000000000, 0.1000000000, 0.1000000000]) {
				translate(v = [0, 0, 1490.0000000000]) {
					linear_extrude(height = 686.1000000000) {
						polygon(paths = [[0, 1, 2, 3]], points = [[1945, 1550], [1945, 1720], [2115, 1720], [2115, 1550]]);
					}
				}
			}
			color(c = [0.1000000000, 0.1000000000, 0.1000000000]) {
				translate(v = [0, 0, 1490.0000000000]) {
					linear_extrude(height = 686.1000000000) {
						polygon(paths = [[0, 1, 2, 3]], points = [[175, 1575], [175, 1745], [345, 1745], [345, 1575]]);
					}
				}
			}
			color(c = [0.1000000000, 0.1000000000, 0.1000000000]) {
				translate(v = [0, 0, 1490.0000000000]) {
					linear_extrude(height = 686.1000000000) {
						polygon(paths = [[0, 1, 2, 3]], points = [[2410, 1575], [2410, 1745], [2580, 1745], [2580, 1575]]);
					}
				}
			}
			color(c = [0.1000000000, 0.1000000000, 0.1000000000]) {
				translate(v = [0, 0, 1490.0000000000]) {
					linear_extrude(height = 686.1000000000) {
						polygon(paths = [[0, 1, 2, 3]], points = [[175, 1915], [175, 2085], [345, 2085], [345, 1915]]);
					}
				}
			}
			color(c = [0.1000000000, 0.1000000000, 0.1000000000]) {
				translate(v = [0, 0, 1490.0000000000]) {
					linear_extrude(height = 686.1000000000) {
						polygon(paths = [[0, 1, 2, 3]], points = [[2410, 1915], [2410, 2085], [2580, 2085], [2580, 1915]]);
					}
				}
			}
			color(c = [0.1000000000, 0.1000000000, 0.1000000000]) {
				translate(v = [0, 0, 1490.0000000000]) {
					linear_extrude(height = 686.1000000000) {
						polygon(paths = [[0, 1, 2, 3]], points = [[1945, 2215], [1945, 2385], [2115, 2385], [2115, 2215]]);
					}
				}
			}
			color(c = [0.1000000000, 0.1000000000, 0.1000000000]) {
				translate(v = [0, 0, 1490.0000000000]) {
					linear_extrude(height = 686.1000000000) {
						polygon(paths = [[0, 1, 2, 3]], points = [[175, 2255], [175, 2425], [345, 2425], [345, 2255]]);
					}
				}
			}
			color(c = [0.1000000000, 0.1000000000, 0.1000000000]) {
				translate(v = [0, 0, 1490.0000000000]) {
					linear_extrude(height = 686.1000000000) {
						polygon(paths = [[0, 1, 2, 3]], points = [[2410, 2255], [2410, 2425], [2580, 2425], [2580, 2255]]);
					}
				}
			}
			color(c = [0.9000000000, 0.6000000000, 0.6000000000]) {
				translate(v = [0, 0, 2176.1000000000]) {
					linear_extrude(height = 100.0000000000) {
						polygon(paths = [[0, 1, 2, 3, 4, 5, 6, 7, 8, 9, 10, 11]], points = [[0, -85], [0, 85], [175, 85], [175, 905], [345, 905], [345, 85], [1015, 85], [1015, 565], [1185, 565], [1185, 85], [2760, 85], [2760, -85]]);
					}
				}
			}
			color(c = [0.9000000000, 0.6000000000, 0.6000000000]) {
				translate(v = [0, 0, 2176.1000000000]) {
					linear_extrude(height = 100.0000000000) {
						polygon(paths = [[0, 1, 2, 3, 4, 5, 6, 7]], points = [[515, 255], [515, 905], [1700, 905], [1700, 255], [1370, 255], [1370, 735], [845, 735], [845, 255]]);
					}
				}
			}
			color(c = [0.9000000000, 0.6000000000, 0.6000000000]) {
				translate(v = [0, 0, 2176.1000000000]) {
					linear_extrude(height = 100.0000000000) {
						polygon(paths = [[0, 1, 2, 3]], points = [[90, 1075], [90, 1325], [440, 1325], [440, 1075]]);
					}
				}
			}
			color(c = [0.9000000000, 0.6000000000, 0.6000000000]) {
				translate(v = [0, 0, 2176.1000000000]) {
					linear_extrude(height = 100.0000000000) {
						polygon(paths = [[0, 1, 2, 3]], points = [[2330, 995], [2330, 1325], [2675, 1325], [2675, 995]]);
					}
				}
			}
			color(c = [0.9000000000, 0.6000000000, 0.6000000000]) {
				translate(v = [0, 0, 2176.1000000000]) {
					linear_extrude(height = 100.0000000000) {
						polygon(paths = [[0, 1, 2, 3, 4, 5]], points = [[1225, 1075], [1225, 1325], [1460, 1325], [1460, 2405], [1700, 2405], [1700, 1075]]);
					}
				}
			}
			color(c = [0.9000000000, 0.6000000000, 0.6000000000]) {
				translate(v = [0, 0, 2176.1000000000]) {
					linear_extrude(height = 100.0000000000) {
						polygon(paths = [[0, 1, 2, 3]], points = [[610, 1075], [610, 2465], [1055, 2465], [1055, 1075]]);
					}
				}
			}
			color(c = [0.9000000000, 0.6000000000, 0.6000000000]) {
				translate(v = [0, 0, 2176.1000000000]) {
					linear_extrude(height = 100.0000000000) {
						polygon(paths = [[0, 1, 2, 3, 4, 5]], points = [[1945, 260], [1945, 2465], [2160, 2465], [2160, 825], [2675, 825], [2675, 260]]);
					}
				}
			}
			color(c = [0.9000000000, 0.6000000000, 0.6000000000]) {
				translate(v = [0, 0, 2176.1000000000]) {
					linear_extrude(height = 100.0000000000) {
						polygon(paths = [[0, 1, 2, 3, 4, 5, 6, 7, 8, 9, 10, 11]], points = [[90, 1495], [90, 2635], [0, 2635], [0, 2805], [2760, 2805], [2760, 2635], [2675, 2635], [2675, 1495], [2330, 1495], [2330, 2635], [440, 2635], [440, 1495]]);
					}
				}
			}
			color(c = [0.5000000000, 0.5000000000, 0.5000000000]) {
				translate(v = [0, 0, 2276.1000000000]) {
					linear_extrude(height = 340.0000000000) {
						polygon(paths = [[0, 1, 2, 3]], points = [[145, -85], [145, 85], [315, 85], [315, -85]]);
					}
				}
			}
			color(c = [0.5000000000, 0.5000000000, 0.5000000000]) {
				translate(v = [0, 0, 2276.1000000000]) {
					linear_extrude(height = 340.0000000000) {
						polygon(paths = [[0, 1, 2, 3]], points = [[605, -85], [605, 85], [775, 85], [775, -85]]);
					}
				}
			}
			color(c = [0.5000000000, 0.5000000000, 0.5000000000]) {
				translate(v = [0, 0, 2276.1000000000]) {
					linear_extrude(height = 340.0000000000) {
						polygon(paths = [[0, 1, 2, 3]], points = [[1065, -85], [1065, 85], [1235, 85], [1235, -85]]);
					}
				}
			}
			color(c = [0.5000000000, 0.5000000000, 0.5000000000]) {
				translate(v = [0, 0, 2276.1000000000]) {
					linear_extrude(height = 340.0000000000) {
						polygon(paths = [[0, 1, 2, 3]], points = [[1525, -85], [1525, 85], [1695, 85], [1695, -85]]);
					}
				}
			}
			color(c = [0.5000000000, 0.5000000000, 0.5000000000]) {
				translate(v = [0, 0, 2276.1000000000]) {
					linear_extrude(height = 340.0000000000) {
						polygon(paths = [[0, 1, 2, 3]], points = [[1985, -85], [1985, 85], [2155, 85], [2155, -85]]);
					}
				}
			}
			color(c = [0.5000000000, 0.5000000000, 0.5000000000]) {
				translate(v = [0, 0, 2276.1000000000]) {
					linear_extrude(height = 340.0000000000) {
						polygon(paths = [[0, 1, 2, 3]], points = [[2445, -85], [2445, 85], [2615, 85], [2615, -85]]);
					}
				}
			}
			color(c = [0.5000000000, 0.5000000000, 0.5000000000]) {
				translate(v = [0, 0, 2276.1000000000]) {
					linear_extrude(height = 340.0000000000) {
						polygon(paths = [[0, 1, 2, 3]], points = [[145, 2635], [145, 2805], [315, 2805], [315, 2635]]);
					}
				}
			}
			color(c = [0.5000000000, 0.5000000000, 0.5000000000]) {
				translate(v = [0, 0, 2276.1000000000]) {
					linear_extrude(height = 340.0000000000) {
						polygon(paths = [[0, 1, 2, 3]], points = [[605, 2635], [605, 2805], [775, 2805], [775, 2635]]);
					}
				}
			}
			color(c = [0.5000000000, 0.5000000000, 0.5000000000]) {
				translate(v = [0, 0, 2276.1000000000]) {
					linear_extrude(height = 340.0000000000) {
						polygon(paths = [[0, 1, 2, 3]], points = [[1065, 2635], [1065, 2805], [1235, 2805], [1235, 2635]]);
					}
				}
			}
			color(c = [0.5000000000, 0.5000000000, 0.5000000000]) {
				translate(v = [0, 0, 2276.1000000000]) {
					linear_extrude(height = 340.0000000000) {
						polygon(paths = [[0, 1, 2, 3]], points = [[1525, 2635], [1525, 2805], [1695, 2805], [1695, 2635]]);
					}
				}
			}
			color(c = [0.5000000000, 0.5000000000, 0.5000000000]) {
				translate(v = [0, 0, 2276.1000000000]) {
					linear_extrude(height = 340.0000000000) {
						polygon(paths = [[0, 1, 2, 3]], points = [[1985, 2635], [1985, 2805], [2155, 2805], [2155, 2635]]);
					}
				}
			}
			color(c = [0.5000000000, 0.5000000000, 0.5000000000]) {
				translate(v = [0, 0, 2276.1000000000]) {
					linear_extrude(height = 340.0000000000) {
						polygon(paths = [[0, 1, 2, 3]], points = [[2445, 2635], [2445, 2805], [2615, 2805], [2615, 2635]]);
					}
				}
			}
			color(c = [0.3000000000, 0.3000000000, 1]) {
				translate(v = [0, 0, 2616.1000000000]) {
					linear_extrude(height = 360.0000000000) {
						polygon(paths = [[0, 1, 2, 3]], points = [[0, -240], [0, 240], [2760, 240], [2760, -240]]);
					}
				}
			}
			color(c = [0.3000000000, 0.3000000000, 1]) {
				translate(v = [0, 0, 2616.1000000000]) {
					linear_extrude(height = 360.0000000000) {
						polygon(paths = [[0, 1, 2, 3]], points = [[0, 2480], [0, 2960], [2760, 2960], [2760, 2480]]);
					}
				}
			}
		}
	}
}
